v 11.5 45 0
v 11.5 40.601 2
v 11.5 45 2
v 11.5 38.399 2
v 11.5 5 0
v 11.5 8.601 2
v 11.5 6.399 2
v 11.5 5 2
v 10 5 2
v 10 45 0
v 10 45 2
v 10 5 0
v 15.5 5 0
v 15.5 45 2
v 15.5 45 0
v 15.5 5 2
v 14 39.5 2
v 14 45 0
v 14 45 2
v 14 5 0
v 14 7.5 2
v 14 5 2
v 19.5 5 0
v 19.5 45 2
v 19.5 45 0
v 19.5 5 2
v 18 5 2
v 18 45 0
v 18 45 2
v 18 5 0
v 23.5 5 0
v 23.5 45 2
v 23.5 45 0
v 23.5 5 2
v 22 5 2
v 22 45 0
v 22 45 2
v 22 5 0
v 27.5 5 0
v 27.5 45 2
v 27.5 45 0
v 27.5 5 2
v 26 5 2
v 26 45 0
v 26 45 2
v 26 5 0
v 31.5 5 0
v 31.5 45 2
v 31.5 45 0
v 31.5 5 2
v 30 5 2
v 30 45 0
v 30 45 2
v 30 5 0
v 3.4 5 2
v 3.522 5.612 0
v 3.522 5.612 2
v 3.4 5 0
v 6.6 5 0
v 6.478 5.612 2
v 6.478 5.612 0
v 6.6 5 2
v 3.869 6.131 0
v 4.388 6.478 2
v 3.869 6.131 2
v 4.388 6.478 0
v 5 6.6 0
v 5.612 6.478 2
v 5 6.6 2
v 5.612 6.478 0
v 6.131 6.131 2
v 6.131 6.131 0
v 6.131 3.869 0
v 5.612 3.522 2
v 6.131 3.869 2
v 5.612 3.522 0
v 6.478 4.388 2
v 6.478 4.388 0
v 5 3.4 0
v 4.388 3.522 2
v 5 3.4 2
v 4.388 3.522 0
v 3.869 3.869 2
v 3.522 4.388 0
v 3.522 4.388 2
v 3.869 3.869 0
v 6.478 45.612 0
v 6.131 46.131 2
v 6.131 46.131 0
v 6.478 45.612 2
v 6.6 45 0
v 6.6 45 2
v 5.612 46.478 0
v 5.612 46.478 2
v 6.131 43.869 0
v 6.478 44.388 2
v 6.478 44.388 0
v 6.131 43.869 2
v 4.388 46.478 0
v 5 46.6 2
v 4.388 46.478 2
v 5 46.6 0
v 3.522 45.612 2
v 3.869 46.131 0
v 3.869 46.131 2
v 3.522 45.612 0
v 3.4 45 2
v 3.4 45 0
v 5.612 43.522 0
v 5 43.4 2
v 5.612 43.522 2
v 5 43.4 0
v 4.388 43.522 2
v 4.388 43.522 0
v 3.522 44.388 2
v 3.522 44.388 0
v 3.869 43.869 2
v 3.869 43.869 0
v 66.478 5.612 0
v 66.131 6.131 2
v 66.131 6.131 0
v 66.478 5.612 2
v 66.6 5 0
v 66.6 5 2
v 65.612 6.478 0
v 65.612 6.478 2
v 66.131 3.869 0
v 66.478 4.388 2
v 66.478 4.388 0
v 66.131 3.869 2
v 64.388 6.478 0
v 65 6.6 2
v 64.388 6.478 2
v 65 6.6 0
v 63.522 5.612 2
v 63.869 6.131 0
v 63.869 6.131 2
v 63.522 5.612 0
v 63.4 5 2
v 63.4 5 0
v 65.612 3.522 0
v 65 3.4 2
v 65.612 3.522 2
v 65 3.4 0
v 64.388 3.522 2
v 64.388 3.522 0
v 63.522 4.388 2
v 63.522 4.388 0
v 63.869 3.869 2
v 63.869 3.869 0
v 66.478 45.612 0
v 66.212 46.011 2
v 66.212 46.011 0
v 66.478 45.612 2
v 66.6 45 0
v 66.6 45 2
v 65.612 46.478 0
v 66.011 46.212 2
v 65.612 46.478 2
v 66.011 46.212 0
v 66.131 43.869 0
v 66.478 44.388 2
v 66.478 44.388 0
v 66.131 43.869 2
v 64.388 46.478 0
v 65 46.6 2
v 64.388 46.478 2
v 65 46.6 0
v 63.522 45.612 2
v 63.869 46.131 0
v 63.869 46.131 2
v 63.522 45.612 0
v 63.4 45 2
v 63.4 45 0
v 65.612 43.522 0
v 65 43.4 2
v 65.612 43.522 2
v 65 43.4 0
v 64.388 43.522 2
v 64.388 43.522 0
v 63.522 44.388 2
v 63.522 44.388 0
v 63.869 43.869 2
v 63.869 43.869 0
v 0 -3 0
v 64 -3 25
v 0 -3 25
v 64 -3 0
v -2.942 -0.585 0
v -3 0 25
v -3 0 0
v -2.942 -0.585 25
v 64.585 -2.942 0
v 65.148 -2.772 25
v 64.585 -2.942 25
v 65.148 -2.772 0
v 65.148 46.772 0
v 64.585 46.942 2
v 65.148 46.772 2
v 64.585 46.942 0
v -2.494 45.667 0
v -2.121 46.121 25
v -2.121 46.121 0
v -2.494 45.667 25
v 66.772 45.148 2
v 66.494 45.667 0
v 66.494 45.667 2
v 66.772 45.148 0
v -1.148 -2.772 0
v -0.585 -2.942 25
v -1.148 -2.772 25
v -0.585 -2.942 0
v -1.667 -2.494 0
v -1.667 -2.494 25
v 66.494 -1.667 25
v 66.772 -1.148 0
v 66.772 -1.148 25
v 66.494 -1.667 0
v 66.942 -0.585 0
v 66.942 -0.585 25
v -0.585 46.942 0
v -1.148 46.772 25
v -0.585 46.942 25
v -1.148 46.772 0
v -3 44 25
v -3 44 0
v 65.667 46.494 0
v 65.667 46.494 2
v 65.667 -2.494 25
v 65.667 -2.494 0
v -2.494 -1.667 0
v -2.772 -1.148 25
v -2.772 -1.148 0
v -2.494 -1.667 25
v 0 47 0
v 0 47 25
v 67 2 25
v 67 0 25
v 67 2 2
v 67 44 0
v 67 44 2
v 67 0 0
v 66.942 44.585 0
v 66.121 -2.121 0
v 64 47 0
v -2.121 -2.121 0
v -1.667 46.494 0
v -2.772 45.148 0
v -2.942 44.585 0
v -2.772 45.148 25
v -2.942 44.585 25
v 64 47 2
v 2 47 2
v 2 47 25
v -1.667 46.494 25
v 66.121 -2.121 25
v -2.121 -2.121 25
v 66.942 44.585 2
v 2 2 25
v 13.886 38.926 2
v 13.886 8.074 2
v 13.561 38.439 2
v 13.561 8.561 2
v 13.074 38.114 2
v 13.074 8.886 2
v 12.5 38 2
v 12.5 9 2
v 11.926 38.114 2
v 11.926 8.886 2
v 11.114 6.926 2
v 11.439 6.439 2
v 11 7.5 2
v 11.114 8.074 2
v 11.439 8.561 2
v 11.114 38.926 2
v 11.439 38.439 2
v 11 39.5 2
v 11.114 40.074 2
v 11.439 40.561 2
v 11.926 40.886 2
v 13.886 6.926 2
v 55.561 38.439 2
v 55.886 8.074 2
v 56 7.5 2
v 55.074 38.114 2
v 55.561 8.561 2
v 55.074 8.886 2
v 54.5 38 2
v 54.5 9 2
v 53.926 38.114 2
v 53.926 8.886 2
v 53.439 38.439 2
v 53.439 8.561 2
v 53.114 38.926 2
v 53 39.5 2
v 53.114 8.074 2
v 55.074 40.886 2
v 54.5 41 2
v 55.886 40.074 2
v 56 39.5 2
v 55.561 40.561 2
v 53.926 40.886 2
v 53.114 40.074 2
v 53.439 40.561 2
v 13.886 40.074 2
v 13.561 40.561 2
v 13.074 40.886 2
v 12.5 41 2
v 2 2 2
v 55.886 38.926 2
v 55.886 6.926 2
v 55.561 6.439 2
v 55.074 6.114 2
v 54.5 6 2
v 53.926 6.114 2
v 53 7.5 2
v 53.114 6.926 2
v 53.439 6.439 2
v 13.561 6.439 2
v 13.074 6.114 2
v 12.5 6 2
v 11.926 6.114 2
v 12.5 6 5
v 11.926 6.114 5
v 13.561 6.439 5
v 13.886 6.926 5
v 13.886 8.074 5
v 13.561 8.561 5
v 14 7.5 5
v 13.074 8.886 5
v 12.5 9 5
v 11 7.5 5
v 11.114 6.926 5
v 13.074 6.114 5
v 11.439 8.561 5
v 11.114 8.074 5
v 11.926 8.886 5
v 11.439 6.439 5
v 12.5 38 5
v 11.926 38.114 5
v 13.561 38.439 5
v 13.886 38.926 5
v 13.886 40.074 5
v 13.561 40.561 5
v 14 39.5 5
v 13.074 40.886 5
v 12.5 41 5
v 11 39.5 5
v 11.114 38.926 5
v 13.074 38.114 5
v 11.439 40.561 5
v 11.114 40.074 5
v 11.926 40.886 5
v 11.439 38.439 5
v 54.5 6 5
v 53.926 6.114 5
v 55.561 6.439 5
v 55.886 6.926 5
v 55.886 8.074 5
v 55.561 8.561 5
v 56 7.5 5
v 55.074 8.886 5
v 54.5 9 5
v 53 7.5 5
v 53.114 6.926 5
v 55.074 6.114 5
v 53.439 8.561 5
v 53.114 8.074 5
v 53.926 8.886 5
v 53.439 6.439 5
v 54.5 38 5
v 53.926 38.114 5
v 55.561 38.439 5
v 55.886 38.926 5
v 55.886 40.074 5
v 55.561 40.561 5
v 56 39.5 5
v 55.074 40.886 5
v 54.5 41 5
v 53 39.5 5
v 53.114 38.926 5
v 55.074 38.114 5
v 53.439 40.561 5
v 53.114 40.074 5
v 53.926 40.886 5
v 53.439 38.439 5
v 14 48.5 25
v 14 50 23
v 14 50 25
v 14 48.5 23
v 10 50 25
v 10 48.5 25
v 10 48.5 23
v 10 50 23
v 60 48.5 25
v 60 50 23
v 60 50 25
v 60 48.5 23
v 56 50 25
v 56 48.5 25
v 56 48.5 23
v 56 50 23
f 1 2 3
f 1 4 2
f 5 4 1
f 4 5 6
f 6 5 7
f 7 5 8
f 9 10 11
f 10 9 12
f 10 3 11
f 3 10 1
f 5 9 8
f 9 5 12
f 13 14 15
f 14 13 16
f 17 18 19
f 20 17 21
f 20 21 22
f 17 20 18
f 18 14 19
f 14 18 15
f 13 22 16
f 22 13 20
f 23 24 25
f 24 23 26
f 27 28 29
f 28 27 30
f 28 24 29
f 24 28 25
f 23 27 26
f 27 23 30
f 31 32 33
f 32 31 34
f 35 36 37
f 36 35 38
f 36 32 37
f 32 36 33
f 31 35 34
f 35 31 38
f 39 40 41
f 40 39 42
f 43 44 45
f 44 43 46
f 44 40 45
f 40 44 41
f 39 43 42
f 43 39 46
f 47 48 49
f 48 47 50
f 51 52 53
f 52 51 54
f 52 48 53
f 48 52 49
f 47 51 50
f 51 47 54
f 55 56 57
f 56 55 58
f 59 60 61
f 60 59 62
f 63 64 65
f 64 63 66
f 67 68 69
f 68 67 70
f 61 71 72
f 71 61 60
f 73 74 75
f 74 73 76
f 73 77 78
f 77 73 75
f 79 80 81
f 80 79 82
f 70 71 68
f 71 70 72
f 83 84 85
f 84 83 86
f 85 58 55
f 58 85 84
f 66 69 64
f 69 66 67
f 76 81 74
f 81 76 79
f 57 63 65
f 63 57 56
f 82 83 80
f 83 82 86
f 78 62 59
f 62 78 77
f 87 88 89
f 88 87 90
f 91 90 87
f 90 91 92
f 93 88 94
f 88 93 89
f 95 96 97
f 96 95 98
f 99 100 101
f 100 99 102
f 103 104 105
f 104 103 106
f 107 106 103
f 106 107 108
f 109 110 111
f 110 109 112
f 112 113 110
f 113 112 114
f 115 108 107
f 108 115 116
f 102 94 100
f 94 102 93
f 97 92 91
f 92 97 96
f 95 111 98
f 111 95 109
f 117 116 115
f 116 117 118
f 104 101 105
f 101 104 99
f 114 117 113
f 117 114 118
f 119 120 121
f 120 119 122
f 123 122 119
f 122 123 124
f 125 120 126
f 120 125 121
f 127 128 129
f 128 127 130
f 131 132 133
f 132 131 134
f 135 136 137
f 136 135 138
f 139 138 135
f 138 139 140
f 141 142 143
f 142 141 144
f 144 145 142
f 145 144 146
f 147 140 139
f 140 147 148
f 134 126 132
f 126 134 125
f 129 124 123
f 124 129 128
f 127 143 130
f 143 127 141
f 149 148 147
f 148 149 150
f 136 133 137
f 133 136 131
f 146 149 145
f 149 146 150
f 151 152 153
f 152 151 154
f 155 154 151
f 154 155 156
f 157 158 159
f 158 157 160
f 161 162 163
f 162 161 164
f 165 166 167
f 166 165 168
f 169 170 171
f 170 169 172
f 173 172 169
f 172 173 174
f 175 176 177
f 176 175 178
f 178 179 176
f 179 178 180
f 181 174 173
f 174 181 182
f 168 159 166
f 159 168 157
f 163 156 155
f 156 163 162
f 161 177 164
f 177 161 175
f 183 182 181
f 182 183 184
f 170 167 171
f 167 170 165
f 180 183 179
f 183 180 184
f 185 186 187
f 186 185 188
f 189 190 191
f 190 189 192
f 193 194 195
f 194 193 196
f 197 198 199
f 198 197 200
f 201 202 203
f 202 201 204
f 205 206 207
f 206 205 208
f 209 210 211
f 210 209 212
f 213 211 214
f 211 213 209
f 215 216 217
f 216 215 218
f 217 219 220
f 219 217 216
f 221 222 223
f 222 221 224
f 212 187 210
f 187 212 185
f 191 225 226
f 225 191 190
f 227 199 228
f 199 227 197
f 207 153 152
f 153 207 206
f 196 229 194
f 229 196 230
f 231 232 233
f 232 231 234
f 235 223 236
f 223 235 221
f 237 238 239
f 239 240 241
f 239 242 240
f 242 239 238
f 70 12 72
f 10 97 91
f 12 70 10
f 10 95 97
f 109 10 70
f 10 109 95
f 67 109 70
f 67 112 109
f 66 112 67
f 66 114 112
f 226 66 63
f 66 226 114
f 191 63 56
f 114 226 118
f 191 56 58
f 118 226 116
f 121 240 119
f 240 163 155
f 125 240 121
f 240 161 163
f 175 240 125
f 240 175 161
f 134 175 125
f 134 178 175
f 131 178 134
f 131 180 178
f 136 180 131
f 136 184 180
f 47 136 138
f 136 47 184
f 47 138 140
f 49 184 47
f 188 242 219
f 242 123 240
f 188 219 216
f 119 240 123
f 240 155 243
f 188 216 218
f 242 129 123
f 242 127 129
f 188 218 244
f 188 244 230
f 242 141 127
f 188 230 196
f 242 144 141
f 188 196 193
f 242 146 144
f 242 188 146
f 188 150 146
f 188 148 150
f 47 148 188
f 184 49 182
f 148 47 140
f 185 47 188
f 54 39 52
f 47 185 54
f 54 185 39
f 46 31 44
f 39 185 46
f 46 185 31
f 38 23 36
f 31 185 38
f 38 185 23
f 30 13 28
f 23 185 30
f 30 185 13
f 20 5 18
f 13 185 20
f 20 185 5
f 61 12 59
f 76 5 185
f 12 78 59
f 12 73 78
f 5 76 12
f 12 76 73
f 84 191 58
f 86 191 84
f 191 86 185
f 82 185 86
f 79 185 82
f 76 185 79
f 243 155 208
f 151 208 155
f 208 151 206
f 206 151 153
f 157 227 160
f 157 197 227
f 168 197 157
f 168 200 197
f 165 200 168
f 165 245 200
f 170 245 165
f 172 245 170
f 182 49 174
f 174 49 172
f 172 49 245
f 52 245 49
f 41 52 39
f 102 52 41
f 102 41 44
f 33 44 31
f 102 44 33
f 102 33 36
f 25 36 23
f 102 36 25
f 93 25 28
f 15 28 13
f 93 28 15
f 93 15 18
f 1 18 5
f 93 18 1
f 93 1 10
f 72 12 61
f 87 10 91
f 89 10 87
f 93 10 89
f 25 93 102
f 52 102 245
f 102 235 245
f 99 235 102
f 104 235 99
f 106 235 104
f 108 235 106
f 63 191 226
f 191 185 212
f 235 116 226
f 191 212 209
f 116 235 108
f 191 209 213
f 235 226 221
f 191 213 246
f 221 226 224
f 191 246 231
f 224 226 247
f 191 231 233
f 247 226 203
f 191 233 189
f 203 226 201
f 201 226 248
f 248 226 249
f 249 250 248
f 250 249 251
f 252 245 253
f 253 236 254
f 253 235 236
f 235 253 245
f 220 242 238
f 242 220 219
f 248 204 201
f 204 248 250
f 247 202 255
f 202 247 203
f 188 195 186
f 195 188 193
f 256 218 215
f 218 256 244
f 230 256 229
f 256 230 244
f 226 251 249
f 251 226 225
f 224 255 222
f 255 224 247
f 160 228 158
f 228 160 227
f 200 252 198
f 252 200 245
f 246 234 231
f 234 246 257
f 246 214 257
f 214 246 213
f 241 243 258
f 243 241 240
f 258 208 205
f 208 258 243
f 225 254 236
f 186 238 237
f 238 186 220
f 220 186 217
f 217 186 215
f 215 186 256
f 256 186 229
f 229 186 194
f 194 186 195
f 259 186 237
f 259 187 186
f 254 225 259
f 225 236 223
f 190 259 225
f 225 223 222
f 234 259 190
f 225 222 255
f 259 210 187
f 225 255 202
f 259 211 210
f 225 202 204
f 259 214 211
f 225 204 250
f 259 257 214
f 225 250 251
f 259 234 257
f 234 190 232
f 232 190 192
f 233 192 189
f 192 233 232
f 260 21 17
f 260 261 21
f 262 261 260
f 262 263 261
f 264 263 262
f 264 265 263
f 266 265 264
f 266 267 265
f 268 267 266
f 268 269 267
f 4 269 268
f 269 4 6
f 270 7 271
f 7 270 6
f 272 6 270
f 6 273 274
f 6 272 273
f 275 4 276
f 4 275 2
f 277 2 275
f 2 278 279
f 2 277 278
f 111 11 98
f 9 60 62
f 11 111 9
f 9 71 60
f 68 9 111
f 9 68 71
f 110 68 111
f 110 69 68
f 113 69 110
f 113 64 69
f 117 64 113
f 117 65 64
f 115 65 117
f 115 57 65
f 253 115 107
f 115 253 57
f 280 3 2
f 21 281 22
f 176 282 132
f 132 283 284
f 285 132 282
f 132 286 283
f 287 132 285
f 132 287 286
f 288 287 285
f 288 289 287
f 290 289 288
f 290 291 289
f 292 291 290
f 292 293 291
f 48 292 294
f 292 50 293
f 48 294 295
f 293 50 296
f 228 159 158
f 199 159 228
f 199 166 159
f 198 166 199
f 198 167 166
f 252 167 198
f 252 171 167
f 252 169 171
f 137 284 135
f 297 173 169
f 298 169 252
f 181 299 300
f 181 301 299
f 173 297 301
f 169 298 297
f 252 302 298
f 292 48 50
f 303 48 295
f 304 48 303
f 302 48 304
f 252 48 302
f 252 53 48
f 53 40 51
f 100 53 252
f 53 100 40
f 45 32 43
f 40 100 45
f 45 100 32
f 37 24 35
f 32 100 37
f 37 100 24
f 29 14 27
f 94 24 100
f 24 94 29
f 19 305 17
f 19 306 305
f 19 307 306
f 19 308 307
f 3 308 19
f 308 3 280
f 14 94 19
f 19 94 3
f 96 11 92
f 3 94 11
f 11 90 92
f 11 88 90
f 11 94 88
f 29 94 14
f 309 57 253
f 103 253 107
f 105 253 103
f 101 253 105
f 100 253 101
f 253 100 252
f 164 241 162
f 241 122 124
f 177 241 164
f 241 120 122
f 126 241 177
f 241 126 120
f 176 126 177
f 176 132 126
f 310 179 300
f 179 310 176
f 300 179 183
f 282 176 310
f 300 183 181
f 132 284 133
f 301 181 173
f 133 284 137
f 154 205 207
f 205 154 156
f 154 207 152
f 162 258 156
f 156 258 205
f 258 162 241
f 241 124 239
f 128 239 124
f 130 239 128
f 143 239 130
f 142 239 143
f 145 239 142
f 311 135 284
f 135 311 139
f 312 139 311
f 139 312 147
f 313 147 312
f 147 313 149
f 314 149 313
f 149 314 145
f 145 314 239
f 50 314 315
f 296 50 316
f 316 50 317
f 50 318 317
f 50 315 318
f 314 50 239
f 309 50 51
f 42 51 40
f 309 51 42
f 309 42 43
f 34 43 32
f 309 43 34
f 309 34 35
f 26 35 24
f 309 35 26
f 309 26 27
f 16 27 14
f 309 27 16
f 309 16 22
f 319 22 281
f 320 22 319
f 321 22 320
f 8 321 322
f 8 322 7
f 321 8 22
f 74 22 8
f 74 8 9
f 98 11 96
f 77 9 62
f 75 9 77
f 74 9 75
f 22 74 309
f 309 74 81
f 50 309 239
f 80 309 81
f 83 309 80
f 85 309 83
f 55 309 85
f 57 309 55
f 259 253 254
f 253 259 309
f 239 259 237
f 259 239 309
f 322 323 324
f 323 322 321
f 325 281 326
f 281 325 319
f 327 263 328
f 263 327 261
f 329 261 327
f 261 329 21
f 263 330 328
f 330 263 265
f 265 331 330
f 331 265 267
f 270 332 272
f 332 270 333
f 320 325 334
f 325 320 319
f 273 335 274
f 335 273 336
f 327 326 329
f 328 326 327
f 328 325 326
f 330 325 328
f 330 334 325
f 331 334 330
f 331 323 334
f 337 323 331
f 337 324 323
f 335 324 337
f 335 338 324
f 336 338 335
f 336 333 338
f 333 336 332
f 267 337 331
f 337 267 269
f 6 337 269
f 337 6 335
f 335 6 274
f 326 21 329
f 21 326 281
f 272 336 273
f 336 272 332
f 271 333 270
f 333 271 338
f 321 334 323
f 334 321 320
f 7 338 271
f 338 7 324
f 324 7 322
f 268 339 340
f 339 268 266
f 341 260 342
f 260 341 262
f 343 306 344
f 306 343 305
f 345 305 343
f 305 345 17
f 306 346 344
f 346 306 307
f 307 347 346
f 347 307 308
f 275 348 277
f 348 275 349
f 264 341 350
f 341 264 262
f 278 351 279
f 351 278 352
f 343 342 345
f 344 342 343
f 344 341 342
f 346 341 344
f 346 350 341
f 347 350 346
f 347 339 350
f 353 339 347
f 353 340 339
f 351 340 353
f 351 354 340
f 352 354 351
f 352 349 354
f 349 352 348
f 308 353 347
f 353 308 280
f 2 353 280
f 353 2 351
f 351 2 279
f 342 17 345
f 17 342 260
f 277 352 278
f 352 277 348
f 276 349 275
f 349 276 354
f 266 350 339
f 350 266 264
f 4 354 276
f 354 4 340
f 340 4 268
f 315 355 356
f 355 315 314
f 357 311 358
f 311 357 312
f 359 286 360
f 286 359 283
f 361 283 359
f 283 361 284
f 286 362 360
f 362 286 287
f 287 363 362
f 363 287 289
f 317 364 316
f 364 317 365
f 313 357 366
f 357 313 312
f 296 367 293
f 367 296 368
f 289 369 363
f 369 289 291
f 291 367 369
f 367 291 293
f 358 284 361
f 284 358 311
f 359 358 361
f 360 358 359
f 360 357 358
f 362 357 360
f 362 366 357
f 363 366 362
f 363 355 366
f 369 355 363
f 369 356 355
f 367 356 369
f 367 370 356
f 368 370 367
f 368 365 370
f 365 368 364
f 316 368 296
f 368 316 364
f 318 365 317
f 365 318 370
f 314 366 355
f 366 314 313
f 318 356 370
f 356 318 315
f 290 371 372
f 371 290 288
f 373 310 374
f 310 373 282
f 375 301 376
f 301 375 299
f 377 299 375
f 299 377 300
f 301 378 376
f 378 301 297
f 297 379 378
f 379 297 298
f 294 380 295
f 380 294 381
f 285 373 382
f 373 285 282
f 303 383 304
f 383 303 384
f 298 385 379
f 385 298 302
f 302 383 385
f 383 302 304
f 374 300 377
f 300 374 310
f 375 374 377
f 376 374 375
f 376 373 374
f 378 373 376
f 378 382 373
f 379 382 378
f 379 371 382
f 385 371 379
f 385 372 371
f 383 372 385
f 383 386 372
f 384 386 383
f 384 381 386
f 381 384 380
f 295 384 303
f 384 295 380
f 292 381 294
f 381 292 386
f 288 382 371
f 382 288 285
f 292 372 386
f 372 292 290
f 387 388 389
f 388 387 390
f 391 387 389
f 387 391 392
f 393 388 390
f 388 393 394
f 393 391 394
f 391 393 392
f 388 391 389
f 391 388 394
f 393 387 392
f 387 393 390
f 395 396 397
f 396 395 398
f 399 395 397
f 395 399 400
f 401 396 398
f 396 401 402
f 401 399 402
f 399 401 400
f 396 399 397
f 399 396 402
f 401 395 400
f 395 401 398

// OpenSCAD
// ============================================
// Flock-You ESP32 Case - Parametric Design
// ============================================
// Licensed under Creative Commons CC-BY-SA 4.0
// Designed for ESP32 DevKit + Breadboard
// https://github.com/yourusername/flock-you-esp32

// === PARAMETERS ===

// Case dimensions
case_length = 70;
case_width = 50;
case_height = 25;
wall = 2;
corner_r = 3;

// Component dimensions
esp32_l = 48;
esp32_w = 28;
esp32_h = 12;
breadboard_l = 45;
breadboard_w = 35;
breadboard_h = 9;

// Features
led_pipe_d = 3;
led_pipe_h = 8;
usb_w = 12;
usb_h = 8;
vent_slot_w = 1.5;
vent_slot_spacing = 4;

// Tolerances
tol = 0.3;
clearance = 1.0;

// === MODULES ===

module case_base() {
    difference() {
        // Main body with rounded corners
        minkowski() {
            cube([case_length - 2*corner_r, 
                  case_width - 2*corner_r, 
                  case_height/2]);
            cylinder(r=corner_r, h=case_height/2, $fn=32);
        }
        
        // Hollow interior
        translate([wall, wall, wall])
            cube([case_length - 2*wall, 
                  case_width - 2*wall,
                  case_height]);
        
        // USB cutout (back)
        translate([case_length - wall - 5, 
                   (case_width - usb_w)/2, 
                   wall + 2])
            cube([10, usb_w, usb_h]);
        
        // USB strain relief channel
        translate([case_length - 15, 
                   (case_width - usb_w + 2)/2, 
                   wall])
            cube([15, usb_w - 2, 3]);
        
        // Ventilation slots (bottom)
        for (i = [0:5]) {
            translate([10 + i * vent_slot_spacing, 
                       5, 
                       -1])
                cube([vent_slot_w, case_width - 10, wall + 2]);
        }
        
        // Mounting holes (corners, optional)
        for (x = [5, case_length - 5])
            for (y = [5, case_width - 5])
                translate([x, y, -1])
                    cylinder(d=3.2, h=wall + 2, $fn=16);
    }
    
    // Breadboard mounting posts
    post_h = 3;
    post_d = 3;
    posts_offset_x = (case_length - breadboard_l) / 2;
    posts_offset_y = (case_width - breadboard_w) / 2;
    
    for (x = [posts_offset_x, posts_offset_x + breadboard_l - post_d])
        for (y = [posts_offset_y, posts_offset_y + breadboard_w - post_d])
            translate([x, y, wall])
                cylinder(d=post_d, h=post_h, $fn=16);
    
    // Snap-fit tabs (lid retention)
    tab_w = 4;
    tab_h = 2;
    tab_d = 1.5;
    
    for (x = [10, case_length - 10 - tab_w])
        for (y = [0, case_width - tab_d]) {
            translate([x, y, case_height - tab_h])
                cube([tab_w, tab_d, tab_h]);
        }
}

module case_lid() {
    lid_thick = 2;
    lip_h = 3;
    lip_inset = wall - tol;
    
    difference() {
        union() {
            // Top surface with rounded corners
            minkowski() {
                cube([case_length - 2*corner_r, 
                      case_width - 2*corner_r, 
                      lid_thick/2]);
                cylinder(r=corner_r, h=lid_thick/2, $fn=32);
            }
            
            // Retaining lip
            translate([lip_inset, lip_inset, -lip_h])
                cube([case_length - 2*lip_inset, 
                      case_width - 2*lip_inset,
                      lip_h]);
        }
        
        // LED light pipe hole
        translate([case_length/2, case_width/2, -lip_h - 1])
            cylinder(d=led_pipe_d + tol, h=lid_thick + lip_h + 2, $fn=16);
        
        // Snap-fit tab slots
        tab_w = 4 + 2*tol;
        tab_h = 2 + tol;
        tab_d = 1.5 + tol;
        
        for (x = [10 - tol, case_length - 10 - tab_w + tol])
            for (y = [-1, case_width - tab_d + 1]) {
                translate([x, y, -lip_h - 1])
                    cube([tab_w, tab_d, lip_h + tab_h + 1]);
            }
        
        // Label recess (optional)
        translate([case_length/2 - 20, case_width/2 - 5, lid_thick - 0.5])
            linear_extrude(0.6)
                text("FLOCK-YOU", size=4, halign="center", font="Liberation Sans:style=Bold");
    }
}

module led_light_pipe() {
    // Clear filament light guide
    pipe_l = led_pipe_h;
    pipe_d = led_pipe_d - 0.2;  // Snug fit
    
    cylinder(d1=pipe_d, d2=pipe_d - 0.5, h=pipe_l, $fn=32);
    
    // Retention ridge
    translate([0, 0, pipe_l - 1])
        cylinder(d=pipe_d + 0.5, h=0.5, $fn=32);
}

module mounting_bracket() {
    // Car dashboard / velcro mount
    bracket_l = case_length + 10;
    bracket_w = 30;
    bracket_thick = 3;
    
    difference() {
        // Base plate with rounded corners
        minkowski() {
            cube([bracket_l - 2*corner_r, 
                  bracket_w - 2*corner_r, 
                  bracket_thick/2]);
           cylinder(r=corner_r, h=bracket_thick/2, $fn=32);
        }
        
        // Screw holes for case attachment
        for (x = [5, case_length + 5])
            for (y = [bracket_w/2])
                translate([x, y, -1])
                    cylinder(d=3.2, h=bracket_thick + 2, $fn=16);
        
        // Velcro adhesive area (smooth recessed surface)
        translate([bracket_l/2 - 25, 5, bracket_thick - 0.5])
            cube([50, bracket_w - 10, 1]);
    }
}

// === RENDER SELECTION ===
// Uncomment the part you want to generate:

case_base();

//translate([0, case_width + 10, 0])  // Offset for printing both
//    case_lid();

//translate([case_length/2, case_width/2, 0])
//    led_light_pipe();

//translate([0, case_width + 40, 0])
//    mounting_bracket();
